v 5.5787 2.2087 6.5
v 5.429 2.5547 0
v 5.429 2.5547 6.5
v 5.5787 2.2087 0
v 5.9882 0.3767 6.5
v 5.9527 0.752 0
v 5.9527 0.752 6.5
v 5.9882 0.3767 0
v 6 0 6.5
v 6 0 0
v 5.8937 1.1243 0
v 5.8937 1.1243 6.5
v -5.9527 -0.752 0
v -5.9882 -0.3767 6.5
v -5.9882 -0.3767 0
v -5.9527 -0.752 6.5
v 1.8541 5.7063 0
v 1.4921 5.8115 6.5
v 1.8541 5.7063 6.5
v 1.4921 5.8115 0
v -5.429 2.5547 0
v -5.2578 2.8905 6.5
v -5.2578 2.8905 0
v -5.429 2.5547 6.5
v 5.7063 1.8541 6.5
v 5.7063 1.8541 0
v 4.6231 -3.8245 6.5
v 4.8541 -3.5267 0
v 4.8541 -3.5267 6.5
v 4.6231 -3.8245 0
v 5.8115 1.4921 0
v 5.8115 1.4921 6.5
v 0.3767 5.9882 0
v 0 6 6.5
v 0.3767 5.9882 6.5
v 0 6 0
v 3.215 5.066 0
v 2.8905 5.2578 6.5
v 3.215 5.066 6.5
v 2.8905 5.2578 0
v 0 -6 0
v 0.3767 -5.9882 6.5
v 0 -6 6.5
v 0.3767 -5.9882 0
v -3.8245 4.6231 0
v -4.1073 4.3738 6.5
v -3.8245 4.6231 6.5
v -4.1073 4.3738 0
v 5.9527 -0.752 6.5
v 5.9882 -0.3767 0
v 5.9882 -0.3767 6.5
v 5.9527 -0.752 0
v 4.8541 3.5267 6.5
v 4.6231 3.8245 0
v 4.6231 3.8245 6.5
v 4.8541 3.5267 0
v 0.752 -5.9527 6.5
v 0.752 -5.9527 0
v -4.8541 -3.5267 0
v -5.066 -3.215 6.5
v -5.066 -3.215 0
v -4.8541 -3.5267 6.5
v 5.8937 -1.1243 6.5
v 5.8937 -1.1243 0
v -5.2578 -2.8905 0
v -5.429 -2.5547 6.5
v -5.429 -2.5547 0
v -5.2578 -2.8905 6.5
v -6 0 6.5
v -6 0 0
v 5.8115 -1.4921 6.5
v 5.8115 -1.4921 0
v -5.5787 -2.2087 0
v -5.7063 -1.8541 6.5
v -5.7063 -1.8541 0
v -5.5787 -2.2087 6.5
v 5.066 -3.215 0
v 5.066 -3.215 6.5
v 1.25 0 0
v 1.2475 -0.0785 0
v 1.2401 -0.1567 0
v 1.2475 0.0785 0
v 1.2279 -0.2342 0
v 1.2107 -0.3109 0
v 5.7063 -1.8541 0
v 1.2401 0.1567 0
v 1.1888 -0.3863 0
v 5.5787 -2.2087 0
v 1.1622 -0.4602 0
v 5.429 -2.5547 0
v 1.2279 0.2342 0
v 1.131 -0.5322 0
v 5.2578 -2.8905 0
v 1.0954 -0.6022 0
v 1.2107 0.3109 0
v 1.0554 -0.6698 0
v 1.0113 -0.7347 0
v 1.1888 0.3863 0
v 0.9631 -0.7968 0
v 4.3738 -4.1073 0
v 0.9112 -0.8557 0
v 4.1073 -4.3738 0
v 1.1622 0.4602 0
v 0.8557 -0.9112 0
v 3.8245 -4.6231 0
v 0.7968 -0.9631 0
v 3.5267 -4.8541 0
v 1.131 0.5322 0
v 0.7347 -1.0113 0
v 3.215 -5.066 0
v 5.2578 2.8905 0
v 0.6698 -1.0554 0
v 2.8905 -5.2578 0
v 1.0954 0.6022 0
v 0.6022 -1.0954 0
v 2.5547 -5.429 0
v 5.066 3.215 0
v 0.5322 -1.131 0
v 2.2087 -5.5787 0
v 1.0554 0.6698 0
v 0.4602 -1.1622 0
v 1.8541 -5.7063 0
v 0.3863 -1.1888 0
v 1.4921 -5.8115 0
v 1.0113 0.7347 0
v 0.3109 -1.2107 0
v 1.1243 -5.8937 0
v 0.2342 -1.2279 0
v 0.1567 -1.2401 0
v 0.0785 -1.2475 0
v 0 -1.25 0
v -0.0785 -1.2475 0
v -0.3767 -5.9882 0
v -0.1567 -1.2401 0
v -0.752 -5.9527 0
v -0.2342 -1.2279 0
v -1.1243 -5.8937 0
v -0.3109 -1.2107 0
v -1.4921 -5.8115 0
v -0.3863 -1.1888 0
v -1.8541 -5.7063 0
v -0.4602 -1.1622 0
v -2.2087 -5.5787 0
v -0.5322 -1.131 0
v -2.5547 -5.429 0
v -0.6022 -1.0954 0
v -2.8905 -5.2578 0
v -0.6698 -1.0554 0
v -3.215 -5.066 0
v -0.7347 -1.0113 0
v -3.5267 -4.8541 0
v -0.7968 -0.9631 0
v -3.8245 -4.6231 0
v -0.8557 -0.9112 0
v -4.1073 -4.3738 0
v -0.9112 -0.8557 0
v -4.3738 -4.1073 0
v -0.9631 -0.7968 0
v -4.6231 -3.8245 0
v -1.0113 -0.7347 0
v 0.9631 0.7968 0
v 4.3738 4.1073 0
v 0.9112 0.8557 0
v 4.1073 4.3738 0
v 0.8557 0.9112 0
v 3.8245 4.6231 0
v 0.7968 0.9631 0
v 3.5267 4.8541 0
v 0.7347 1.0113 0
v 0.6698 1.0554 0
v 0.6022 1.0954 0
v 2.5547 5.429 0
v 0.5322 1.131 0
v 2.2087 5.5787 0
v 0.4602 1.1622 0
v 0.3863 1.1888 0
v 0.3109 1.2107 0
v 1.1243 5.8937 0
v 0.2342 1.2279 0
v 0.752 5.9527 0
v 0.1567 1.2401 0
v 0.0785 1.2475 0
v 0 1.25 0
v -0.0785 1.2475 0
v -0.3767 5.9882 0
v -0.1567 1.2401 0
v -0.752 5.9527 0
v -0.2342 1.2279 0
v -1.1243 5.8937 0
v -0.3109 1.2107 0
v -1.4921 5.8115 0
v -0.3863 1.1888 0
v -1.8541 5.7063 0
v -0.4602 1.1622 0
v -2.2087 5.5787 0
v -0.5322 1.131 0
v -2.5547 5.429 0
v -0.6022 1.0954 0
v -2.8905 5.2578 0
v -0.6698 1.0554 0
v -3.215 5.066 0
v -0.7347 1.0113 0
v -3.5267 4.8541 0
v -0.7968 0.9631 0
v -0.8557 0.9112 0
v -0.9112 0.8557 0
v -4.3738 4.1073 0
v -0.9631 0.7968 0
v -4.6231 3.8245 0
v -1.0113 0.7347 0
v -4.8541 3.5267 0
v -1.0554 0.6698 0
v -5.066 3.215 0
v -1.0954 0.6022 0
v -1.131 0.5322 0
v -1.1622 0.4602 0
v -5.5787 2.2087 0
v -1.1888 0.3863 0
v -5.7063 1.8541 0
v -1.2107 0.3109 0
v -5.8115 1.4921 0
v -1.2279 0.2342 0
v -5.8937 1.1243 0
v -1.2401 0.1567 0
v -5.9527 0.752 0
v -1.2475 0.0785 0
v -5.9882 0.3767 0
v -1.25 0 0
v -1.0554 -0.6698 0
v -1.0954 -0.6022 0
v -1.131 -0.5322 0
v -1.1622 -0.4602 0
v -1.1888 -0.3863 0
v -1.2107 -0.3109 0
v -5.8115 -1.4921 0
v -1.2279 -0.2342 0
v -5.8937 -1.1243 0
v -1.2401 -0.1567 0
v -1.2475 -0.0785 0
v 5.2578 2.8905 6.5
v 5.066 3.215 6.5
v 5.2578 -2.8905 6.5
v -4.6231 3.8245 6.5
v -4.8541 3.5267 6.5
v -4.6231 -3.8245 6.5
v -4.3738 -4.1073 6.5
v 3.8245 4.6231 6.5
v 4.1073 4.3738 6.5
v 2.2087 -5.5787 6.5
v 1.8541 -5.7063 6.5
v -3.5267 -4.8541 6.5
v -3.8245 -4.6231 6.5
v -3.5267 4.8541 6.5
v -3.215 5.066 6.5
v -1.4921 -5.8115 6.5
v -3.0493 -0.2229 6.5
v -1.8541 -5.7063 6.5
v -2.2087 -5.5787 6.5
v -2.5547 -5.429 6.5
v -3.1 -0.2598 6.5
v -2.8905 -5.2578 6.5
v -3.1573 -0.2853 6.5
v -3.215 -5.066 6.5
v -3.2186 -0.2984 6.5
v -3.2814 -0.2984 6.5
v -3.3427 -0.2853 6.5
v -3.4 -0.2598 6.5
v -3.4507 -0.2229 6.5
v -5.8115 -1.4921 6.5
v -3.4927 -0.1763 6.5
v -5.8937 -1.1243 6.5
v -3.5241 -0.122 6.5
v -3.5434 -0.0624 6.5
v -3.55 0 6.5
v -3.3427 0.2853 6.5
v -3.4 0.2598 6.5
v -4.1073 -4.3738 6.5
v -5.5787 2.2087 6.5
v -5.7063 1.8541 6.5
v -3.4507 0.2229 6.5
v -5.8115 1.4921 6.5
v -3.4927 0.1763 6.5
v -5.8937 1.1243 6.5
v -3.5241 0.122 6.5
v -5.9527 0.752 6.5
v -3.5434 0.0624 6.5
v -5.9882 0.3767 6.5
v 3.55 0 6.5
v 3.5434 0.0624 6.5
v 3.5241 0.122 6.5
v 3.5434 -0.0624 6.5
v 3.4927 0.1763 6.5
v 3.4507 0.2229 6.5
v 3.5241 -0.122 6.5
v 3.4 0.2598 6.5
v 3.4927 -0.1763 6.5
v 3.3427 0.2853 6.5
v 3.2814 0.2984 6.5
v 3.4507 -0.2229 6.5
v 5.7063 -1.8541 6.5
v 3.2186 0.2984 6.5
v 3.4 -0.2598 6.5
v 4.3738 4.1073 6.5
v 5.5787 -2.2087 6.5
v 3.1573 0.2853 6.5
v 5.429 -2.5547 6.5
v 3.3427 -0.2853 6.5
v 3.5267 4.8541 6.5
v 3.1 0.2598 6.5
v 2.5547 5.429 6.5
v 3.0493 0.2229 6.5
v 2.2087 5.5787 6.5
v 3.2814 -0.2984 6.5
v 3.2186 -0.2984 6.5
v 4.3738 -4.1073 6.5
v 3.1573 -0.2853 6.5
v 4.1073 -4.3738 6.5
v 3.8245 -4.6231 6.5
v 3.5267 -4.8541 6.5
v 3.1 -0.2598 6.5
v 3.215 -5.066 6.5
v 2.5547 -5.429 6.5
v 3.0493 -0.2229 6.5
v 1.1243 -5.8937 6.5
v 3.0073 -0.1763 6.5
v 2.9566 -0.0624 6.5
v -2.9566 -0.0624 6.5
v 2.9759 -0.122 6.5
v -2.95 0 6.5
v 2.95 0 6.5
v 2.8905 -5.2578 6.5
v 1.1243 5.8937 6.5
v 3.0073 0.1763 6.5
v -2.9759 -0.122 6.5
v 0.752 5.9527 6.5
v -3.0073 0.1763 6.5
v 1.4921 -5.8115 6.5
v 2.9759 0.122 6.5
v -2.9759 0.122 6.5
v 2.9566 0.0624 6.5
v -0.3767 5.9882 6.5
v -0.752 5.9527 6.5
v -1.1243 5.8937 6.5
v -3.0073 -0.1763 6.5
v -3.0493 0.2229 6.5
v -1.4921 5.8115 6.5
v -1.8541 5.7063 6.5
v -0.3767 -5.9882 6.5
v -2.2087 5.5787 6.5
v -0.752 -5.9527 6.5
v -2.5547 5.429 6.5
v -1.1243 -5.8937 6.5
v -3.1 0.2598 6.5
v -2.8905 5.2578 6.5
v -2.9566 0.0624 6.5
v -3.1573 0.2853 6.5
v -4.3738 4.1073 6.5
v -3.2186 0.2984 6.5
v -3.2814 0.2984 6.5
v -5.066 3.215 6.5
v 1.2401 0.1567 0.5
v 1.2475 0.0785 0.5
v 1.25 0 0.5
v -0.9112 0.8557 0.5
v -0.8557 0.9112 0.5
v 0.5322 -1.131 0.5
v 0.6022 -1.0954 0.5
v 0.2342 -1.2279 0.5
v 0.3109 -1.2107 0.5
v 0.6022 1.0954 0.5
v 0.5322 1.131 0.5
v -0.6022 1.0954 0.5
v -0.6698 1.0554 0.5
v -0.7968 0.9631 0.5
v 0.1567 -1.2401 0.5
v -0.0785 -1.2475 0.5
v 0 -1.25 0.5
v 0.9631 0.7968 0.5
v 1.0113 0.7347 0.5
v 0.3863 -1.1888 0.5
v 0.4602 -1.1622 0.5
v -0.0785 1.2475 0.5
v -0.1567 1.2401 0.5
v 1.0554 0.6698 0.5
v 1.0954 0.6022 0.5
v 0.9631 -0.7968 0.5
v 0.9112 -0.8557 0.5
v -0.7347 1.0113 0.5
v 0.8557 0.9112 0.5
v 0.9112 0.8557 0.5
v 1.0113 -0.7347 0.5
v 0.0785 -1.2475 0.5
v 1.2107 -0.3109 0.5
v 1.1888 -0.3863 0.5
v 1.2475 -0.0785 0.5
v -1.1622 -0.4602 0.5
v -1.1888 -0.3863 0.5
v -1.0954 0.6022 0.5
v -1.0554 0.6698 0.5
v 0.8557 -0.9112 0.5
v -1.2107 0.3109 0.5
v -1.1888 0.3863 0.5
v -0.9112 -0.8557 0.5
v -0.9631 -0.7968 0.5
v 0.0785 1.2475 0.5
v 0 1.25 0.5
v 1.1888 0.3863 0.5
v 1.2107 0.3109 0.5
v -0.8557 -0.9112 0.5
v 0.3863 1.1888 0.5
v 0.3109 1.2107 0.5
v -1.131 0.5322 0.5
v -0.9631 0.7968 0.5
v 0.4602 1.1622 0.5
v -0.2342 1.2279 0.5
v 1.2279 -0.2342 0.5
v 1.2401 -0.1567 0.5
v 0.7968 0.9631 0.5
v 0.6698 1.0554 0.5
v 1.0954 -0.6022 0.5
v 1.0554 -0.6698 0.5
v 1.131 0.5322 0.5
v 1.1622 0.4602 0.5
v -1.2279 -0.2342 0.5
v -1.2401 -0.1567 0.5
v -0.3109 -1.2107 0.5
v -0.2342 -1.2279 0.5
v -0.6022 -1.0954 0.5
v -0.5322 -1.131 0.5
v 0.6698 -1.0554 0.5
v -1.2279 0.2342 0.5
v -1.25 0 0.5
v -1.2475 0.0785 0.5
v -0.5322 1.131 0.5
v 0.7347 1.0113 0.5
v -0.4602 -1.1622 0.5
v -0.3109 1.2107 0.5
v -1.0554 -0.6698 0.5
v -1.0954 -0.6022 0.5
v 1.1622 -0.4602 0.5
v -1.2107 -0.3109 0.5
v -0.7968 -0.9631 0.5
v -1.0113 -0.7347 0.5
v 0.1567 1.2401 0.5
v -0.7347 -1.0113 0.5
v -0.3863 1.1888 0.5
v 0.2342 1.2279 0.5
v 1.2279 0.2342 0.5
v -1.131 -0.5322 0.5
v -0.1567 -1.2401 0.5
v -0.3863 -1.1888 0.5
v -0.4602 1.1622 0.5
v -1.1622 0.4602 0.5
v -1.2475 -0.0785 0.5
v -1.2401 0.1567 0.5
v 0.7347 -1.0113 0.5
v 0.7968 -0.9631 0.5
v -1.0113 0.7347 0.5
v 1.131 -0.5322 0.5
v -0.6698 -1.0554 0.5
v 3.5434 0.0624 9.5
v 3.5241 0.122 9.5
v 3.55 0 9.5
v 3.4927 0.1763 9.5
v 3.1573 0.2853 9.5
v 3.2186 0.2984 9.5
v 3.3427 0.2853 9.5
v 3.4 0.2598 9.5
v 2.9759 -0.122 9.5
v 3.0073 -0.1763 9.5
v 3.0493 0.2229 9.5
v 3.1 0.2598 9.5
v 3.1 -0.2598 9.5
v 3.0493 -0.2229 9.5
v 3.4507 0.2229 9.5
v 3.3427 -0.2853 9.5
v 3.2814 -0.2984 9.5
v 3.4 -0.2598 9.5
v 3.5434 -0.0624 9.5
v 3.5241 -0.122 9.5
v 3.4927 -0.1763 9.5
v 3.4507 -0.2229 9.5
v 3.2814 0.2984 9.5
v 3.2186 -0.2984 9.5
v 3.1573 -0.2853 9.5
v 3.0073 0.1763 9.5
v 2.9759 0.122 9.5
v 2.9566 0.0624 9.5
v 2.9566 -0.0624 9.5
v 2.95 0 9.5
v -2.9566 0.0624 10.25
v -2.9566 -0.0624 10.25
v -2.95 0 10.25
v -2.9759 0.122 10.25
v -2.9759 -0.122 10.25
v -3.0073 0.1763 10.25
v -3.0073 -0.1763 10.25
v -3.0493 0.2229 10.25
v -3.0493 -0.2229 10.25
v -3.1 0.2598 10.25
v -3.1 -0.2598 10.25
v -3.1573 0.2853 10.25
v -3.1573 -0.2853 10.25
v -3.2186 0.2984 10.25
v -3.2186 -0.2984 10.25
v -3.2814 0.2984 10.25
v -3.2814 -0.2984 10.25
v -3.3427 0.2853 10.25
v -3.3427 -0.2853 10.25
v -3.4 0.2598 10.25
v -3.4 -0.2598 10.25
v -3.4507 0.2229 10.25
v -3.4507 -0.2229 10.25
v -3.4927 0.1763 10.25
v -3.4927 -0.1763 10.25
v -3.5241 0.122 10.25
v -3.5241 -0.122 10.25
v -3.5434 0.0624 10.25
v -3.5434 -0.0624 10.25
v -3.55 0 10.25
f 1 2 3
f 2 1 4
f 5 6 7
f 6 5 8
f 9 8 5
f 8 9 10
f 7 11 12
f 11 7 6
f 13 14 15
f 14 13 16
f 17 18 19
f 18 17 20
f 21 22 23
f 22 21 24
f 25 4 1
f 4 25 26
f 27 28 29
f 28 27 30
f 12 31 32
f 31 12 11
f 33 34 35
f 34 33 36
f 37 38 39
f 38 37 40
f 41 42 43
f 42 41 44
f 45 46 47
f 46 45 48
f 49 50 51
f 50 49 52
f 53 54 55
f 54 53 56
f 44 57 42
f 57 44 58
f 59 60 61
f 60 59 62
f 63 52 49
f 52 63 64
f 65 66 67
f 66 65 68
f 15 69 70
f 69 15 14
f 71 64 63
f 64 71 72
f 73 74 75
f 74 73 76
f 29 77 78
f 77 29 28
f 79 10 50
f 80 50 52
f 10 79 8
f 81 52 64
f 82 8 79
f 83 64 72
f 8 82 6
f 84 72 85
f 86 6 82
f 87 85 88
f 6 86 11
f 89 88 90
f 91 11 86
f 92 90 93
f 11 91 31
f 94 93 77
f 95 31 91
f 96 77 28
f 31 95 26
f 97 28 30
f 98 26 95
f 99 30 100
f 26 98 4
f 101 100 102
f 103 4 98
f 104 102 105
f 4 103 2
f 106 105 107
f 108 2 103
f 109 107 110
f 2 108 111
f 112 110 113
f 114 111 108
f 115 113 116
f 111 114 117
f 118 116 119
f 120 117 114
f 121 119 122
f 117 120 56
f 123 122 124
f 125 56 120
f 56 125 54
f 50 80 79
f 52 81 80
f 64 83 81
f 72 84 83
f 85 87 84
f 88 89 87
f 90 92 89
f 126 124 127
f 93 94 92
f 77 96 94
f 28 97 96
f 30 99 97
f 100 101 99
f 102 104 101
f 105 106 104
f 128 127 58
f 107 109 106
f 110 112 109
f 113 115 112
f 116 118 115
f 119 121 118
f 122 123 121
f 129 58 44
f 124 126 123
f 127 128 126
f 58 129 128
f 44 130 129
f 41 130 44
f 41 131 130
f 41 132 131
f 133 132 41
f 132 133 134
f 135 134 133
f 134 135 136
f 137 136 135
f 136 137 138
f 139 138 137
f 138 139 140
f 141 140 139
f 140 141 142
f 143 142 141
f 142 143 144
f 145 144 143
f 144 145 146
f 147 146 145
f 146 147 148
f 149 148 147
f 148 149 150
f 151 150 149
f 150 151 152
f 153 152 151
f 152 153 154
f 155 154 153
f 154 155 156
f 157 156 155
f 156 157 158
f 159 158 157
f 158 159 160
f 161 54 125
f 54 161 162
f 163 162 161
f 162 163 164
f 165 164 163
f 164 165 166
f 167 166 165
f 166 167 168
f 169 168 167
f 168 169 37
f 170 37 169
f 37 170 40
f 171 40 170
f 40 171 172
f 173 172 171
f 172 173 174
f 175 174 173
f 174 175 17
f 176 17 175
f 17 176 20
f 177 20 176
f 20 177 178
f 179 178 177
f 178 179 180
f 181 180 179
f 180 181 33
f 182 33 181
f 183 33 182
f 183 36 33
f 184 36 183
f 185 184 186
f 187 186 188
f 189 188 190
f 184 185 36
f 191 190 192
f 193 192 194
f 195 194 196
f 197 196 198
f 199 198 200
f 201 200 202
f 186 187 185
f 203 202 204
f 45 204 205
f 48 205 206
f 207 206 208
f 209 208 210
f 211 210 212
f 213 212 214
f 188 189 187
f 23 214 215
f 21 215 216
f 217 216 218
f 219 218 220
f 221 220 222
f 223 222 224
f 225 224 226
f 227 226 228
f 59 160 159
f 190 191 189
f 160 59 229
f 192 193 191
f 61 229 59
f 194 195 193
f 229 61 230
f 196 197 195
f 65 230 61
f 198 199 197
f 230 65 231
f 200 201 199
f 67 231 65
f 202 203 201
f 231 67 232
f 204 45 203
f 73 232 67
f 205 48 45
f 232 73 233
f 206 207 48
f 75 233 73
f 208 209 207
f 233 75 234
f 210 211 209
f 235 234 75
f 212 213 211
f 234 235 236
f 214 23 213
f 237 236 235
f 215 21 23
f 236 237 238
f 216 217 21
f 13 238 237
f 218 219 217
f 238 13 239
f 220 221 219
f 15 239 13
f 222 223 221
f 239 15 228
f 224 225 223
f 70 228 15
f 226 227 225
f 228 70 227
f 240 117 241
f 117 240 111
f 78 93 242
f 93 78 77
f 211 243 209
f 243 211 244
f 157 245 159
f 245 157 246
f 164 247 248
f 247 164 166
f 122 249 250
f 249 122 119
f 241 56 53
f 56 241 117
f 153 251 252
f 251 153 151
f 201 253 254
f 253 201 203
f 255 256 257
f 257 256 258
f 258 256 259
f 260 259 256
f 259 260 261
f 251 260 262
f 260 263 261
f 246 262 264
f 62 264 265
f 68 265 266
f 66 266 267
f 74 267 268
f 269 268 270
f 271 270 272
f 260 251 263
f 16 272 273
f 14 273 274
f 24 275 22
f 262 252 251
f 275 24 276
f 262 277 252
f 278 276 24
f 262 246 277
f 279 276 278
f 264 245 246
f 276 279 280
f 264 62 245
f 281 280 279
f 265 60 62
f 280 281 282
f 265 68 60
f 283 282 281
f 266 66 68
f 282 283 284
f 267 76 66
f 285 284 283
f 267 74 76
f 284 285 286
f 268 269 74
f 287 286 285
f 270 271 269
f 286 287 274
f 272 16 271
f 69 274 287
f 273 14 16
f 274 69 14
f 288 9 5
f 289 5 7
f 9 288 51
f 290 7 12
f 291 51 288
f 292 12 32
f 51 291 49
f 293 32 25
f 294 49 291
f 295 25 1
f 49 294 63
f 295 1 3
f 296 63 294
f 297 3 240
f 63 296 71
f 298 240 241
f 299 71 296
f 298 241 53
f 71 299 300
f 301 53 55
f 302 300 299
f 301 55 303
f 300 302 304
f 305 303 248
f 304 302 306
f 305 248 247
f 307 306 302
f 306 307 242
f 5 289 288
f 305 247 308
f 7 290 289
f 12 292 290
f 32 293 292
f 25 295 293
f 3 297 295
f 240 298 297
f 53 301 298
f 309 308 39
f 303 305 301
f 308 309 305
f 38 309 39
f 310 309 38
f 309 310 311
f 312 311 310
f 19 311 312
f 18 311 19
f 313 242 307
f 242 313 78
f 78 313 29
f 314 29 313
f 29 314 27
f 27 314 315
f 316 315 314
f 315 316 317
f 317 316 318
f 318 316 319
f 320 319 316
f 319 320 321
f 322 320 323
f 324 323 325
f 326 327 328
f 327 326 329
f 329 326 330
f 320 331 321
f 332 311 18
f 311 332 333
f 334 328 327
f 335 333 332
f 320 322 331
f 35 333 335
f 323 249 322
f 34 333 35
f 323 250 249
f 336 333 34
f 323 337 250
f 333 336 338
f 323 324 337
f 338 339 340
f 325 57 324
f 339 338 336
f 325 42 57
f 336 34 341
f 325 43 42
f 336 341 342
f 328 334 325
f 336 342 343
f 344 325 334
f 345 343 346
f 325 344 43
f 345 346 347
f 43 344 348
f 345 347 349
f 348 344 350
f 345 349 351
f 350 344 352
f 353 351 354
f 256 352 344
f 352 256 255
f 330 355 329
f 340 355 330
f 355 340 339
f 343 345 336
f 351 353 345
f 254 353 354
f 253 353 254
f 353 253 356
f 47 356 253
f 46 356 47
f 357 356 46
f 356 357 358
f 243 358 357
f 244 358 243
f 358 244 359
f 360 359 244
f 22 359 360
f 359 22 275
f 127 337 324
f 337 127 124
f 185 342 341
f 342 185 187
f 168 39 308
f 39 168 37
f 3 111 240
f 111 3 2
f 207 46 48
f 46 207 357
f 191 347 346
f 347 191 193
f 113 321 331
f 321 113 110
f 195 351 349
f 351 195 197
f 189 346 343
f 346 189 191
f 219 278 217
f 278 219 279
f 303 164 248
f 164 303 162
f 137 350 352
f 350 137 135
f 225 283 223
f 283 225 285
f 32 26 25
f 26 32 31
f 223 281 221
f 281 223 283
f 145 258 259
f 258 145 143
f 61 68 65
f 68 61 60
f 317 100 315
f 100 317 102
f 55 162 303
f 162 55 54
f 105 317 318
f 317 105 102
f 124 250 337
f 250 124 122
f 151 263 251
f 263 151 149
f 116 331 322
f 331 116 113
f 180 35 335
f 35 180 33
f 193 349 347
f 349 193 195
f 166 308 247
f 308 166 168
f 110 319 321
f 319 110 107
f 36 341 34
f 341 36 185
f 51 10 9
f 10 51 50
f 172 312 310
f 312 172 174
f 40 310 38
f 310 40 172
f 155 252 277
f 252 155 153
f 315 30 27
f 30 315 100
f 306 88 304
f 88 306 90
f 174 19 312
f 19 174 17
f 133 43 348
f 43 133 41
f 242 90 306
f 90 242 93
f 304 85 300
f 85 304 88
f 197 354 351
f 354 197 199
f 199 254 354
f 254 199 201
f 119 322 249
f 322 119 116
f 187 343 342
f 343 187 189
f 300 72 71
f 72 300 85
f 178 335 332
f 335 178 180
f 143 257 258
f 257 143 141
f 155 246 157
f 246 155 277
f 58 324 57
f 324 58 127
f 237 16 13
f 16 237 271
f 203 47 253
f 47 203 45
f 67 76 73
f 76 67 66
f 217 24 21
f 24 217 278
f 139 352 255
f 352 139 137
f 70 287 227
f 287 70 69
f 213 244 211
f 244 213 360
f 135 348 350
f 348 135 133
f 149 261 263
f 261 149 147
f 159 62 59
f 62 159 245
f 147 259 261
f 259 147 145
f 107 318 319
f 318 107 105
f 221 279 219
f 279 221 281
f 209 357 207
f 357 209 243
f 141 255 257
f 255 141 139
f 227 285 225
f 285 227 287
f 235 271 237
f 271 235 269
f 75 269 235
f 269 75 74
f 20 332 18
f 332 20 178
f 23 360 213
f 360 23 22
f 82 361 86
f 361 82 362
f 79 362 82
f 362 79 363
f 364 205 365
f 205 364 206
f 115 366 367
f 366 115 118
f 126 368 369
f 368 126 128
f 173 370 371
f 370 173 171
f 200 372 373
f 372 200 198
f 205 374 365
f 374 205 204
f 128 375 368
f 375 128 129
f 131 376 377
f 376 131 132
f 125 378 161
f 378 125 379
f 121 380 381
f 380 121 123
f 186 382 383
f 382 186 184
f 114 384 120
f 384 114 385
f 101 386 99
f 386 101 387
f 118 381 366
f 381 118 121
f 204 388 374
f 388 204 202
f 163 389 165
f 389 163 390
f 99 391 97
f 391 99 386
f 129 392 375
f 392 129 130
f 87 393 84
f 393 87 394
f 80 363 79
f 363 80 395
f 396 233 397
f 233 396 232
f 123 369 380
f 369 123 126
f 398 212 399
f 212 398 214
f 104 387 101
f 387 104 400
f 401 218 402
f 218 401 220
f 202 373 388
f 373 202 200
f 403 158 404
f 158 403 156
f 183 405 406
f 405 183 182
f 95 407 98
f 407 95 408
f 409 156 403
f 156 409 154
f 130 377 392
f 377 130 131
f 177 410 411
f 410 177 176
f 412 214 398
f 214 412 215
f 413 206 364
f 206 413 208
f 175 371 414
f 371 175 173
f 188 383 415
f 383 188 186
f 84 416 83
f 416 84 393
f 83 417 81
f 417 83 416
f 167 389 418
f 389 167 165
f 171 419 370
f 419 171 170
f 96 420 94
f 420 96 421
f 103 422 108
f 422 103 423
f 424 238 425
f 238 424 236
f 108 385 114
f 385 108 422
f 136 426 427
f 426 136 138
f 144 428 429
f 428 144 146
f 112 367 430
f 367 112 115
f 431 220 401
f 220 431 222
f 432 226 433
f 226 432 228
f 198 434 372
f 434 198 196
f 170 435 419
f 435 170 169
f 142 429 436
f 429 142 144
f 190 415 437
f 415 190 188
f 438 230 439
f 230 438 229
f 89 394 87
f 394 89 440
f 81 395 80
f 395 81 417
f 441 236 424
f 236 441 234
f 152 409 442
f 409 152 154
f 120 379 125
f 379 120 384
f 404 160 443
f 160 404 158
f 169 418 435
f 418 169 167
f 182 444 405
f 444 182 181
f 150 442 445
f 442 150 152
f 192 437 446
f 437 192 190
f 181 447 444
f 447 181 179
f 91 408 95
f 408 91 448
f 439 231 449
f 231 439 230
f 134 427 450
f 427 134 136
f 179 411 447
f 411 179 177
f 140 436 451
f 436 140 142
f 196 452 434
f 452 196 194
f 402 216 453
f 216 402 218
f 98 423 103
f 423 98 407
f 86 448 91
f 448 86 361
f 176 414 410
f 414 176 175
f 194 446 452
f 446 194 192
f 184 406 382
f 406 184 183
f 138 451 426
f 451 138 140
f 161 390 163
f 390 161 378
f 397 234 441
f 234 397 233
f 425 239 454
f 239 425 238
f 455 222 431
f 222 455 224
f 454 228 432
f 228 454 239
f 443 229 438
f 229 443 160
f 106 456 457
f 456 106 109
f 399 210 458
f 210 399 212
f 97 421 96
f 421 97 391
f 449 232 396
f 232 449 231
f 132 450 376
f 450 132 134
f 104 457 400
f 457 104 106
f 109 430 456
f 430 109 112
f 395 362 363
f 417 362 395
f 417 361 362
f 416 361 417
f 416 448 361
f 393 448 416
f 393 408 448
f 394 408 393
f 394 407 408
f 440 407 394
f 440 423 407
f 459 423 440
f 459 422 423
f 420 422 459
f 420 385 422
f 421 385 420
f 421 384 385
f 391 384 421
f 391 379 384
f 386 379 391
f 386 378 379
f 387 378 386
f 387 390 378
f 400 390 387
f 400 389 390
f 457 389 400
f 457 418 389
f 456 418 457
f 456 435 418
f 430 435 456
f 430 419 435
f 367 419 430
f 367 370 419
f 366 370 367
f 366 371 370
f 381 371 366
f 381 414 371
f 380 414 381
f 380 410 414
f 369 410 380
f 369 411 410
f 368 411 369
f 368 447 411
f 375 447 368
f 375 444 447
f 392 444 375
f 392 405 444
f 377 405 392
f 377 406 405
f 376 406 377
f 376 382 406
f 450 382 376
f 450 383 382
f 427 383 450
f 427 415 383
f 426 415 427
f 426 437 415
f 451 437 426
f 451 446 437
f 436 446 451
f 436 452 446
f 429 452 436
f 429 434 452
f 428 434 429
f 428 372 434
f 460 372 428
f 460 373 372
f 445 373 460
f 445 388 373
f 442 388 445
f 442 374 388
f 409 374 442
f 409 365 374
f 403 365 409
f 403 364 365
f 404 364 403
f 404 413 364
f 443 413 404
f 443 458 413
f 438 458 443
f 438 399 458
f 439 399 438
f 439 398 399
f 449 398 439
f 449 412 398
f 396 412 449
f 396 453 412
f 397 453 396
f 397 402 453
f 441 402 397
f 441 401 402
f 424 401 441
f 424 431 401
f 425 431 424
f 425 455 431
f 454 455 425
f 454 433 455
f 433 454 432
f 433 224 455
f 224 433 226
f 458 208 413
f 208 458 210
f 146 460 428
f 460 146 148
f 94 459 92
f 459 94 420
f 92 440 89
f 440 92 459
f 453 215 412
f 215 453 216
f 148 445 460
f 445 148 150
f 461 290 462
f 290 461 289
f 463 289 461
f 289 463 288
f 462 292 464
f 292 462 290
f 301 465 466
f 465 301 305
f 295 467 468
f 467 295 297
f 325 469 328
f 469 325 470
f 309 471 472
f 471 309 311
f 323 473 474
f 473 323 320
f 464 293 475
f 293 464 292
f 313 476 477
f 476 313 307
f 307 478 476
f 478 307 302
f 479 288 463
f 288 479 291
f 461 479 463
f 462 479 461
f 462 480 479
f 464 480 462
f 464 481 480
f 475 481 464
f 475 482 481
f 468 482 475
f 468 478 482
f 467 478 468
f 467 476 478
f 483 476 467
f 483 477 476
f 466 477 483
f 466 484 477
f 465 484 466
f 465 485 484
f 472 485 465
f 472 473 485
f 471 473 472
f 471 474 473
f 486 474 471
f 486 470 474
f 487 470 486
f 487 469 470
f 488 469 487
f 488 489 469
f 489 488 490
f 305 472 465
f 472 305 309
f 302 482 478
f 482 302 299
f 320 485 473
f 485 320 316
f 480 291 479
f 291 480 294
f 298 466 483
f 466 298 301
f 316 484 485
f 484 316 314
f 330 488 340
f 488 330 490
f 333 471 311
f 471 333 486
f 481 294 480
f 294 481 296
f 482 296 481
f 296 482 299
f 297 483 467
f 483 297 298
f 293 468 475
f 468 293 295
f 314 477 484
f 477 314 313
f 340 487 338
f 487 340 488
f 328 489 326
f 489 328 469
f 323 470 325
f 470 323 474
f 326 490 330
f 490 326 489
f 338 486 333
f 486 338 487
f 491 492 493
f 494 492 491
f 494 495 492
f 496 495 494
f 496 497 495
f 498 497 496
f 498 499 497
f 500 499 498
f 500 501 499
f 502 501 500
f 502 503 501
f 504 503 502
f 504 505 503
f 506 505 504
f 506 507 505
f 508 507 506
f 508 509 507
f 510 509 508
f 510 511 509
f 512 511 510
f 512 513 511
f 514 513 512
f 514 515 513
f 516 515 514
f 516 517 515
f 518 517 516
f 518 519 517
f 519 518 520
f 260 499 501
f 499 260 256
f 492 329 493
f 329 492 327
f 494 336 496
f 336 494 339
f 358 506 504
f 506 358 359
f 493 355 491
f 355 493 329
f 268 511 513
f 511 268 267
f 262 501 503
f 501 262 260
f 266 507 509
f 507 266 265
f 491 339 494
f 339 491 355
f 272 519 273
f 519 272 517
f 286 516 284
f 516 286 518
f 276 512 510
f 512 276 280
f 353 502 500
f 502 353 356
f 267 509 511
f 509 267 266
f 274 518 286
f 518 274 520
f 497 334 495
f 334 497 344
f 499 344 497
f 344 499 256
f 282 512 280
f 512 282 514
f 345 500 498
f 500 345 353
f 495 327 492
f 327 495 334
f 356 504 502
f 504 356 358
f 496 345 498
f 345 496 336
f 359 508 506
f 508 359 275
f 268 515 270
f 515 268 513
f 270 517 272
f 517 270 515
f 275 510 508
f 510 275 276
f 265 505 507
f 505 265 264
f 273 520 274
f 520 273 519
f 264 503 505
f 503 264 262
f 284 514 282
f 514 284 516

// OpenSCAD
difference() {
    cylinder(6.5, r=6, $fn=100);
    cylinder(0.5, r=1.25, $fn=100);
    }
translate([3.25,0,6.5])
    cylinder(3, r=0.3, $fn=30);
translate([-3.25,0,6.5])
    cylinder(3.75, r=0.3, $fn=30);
